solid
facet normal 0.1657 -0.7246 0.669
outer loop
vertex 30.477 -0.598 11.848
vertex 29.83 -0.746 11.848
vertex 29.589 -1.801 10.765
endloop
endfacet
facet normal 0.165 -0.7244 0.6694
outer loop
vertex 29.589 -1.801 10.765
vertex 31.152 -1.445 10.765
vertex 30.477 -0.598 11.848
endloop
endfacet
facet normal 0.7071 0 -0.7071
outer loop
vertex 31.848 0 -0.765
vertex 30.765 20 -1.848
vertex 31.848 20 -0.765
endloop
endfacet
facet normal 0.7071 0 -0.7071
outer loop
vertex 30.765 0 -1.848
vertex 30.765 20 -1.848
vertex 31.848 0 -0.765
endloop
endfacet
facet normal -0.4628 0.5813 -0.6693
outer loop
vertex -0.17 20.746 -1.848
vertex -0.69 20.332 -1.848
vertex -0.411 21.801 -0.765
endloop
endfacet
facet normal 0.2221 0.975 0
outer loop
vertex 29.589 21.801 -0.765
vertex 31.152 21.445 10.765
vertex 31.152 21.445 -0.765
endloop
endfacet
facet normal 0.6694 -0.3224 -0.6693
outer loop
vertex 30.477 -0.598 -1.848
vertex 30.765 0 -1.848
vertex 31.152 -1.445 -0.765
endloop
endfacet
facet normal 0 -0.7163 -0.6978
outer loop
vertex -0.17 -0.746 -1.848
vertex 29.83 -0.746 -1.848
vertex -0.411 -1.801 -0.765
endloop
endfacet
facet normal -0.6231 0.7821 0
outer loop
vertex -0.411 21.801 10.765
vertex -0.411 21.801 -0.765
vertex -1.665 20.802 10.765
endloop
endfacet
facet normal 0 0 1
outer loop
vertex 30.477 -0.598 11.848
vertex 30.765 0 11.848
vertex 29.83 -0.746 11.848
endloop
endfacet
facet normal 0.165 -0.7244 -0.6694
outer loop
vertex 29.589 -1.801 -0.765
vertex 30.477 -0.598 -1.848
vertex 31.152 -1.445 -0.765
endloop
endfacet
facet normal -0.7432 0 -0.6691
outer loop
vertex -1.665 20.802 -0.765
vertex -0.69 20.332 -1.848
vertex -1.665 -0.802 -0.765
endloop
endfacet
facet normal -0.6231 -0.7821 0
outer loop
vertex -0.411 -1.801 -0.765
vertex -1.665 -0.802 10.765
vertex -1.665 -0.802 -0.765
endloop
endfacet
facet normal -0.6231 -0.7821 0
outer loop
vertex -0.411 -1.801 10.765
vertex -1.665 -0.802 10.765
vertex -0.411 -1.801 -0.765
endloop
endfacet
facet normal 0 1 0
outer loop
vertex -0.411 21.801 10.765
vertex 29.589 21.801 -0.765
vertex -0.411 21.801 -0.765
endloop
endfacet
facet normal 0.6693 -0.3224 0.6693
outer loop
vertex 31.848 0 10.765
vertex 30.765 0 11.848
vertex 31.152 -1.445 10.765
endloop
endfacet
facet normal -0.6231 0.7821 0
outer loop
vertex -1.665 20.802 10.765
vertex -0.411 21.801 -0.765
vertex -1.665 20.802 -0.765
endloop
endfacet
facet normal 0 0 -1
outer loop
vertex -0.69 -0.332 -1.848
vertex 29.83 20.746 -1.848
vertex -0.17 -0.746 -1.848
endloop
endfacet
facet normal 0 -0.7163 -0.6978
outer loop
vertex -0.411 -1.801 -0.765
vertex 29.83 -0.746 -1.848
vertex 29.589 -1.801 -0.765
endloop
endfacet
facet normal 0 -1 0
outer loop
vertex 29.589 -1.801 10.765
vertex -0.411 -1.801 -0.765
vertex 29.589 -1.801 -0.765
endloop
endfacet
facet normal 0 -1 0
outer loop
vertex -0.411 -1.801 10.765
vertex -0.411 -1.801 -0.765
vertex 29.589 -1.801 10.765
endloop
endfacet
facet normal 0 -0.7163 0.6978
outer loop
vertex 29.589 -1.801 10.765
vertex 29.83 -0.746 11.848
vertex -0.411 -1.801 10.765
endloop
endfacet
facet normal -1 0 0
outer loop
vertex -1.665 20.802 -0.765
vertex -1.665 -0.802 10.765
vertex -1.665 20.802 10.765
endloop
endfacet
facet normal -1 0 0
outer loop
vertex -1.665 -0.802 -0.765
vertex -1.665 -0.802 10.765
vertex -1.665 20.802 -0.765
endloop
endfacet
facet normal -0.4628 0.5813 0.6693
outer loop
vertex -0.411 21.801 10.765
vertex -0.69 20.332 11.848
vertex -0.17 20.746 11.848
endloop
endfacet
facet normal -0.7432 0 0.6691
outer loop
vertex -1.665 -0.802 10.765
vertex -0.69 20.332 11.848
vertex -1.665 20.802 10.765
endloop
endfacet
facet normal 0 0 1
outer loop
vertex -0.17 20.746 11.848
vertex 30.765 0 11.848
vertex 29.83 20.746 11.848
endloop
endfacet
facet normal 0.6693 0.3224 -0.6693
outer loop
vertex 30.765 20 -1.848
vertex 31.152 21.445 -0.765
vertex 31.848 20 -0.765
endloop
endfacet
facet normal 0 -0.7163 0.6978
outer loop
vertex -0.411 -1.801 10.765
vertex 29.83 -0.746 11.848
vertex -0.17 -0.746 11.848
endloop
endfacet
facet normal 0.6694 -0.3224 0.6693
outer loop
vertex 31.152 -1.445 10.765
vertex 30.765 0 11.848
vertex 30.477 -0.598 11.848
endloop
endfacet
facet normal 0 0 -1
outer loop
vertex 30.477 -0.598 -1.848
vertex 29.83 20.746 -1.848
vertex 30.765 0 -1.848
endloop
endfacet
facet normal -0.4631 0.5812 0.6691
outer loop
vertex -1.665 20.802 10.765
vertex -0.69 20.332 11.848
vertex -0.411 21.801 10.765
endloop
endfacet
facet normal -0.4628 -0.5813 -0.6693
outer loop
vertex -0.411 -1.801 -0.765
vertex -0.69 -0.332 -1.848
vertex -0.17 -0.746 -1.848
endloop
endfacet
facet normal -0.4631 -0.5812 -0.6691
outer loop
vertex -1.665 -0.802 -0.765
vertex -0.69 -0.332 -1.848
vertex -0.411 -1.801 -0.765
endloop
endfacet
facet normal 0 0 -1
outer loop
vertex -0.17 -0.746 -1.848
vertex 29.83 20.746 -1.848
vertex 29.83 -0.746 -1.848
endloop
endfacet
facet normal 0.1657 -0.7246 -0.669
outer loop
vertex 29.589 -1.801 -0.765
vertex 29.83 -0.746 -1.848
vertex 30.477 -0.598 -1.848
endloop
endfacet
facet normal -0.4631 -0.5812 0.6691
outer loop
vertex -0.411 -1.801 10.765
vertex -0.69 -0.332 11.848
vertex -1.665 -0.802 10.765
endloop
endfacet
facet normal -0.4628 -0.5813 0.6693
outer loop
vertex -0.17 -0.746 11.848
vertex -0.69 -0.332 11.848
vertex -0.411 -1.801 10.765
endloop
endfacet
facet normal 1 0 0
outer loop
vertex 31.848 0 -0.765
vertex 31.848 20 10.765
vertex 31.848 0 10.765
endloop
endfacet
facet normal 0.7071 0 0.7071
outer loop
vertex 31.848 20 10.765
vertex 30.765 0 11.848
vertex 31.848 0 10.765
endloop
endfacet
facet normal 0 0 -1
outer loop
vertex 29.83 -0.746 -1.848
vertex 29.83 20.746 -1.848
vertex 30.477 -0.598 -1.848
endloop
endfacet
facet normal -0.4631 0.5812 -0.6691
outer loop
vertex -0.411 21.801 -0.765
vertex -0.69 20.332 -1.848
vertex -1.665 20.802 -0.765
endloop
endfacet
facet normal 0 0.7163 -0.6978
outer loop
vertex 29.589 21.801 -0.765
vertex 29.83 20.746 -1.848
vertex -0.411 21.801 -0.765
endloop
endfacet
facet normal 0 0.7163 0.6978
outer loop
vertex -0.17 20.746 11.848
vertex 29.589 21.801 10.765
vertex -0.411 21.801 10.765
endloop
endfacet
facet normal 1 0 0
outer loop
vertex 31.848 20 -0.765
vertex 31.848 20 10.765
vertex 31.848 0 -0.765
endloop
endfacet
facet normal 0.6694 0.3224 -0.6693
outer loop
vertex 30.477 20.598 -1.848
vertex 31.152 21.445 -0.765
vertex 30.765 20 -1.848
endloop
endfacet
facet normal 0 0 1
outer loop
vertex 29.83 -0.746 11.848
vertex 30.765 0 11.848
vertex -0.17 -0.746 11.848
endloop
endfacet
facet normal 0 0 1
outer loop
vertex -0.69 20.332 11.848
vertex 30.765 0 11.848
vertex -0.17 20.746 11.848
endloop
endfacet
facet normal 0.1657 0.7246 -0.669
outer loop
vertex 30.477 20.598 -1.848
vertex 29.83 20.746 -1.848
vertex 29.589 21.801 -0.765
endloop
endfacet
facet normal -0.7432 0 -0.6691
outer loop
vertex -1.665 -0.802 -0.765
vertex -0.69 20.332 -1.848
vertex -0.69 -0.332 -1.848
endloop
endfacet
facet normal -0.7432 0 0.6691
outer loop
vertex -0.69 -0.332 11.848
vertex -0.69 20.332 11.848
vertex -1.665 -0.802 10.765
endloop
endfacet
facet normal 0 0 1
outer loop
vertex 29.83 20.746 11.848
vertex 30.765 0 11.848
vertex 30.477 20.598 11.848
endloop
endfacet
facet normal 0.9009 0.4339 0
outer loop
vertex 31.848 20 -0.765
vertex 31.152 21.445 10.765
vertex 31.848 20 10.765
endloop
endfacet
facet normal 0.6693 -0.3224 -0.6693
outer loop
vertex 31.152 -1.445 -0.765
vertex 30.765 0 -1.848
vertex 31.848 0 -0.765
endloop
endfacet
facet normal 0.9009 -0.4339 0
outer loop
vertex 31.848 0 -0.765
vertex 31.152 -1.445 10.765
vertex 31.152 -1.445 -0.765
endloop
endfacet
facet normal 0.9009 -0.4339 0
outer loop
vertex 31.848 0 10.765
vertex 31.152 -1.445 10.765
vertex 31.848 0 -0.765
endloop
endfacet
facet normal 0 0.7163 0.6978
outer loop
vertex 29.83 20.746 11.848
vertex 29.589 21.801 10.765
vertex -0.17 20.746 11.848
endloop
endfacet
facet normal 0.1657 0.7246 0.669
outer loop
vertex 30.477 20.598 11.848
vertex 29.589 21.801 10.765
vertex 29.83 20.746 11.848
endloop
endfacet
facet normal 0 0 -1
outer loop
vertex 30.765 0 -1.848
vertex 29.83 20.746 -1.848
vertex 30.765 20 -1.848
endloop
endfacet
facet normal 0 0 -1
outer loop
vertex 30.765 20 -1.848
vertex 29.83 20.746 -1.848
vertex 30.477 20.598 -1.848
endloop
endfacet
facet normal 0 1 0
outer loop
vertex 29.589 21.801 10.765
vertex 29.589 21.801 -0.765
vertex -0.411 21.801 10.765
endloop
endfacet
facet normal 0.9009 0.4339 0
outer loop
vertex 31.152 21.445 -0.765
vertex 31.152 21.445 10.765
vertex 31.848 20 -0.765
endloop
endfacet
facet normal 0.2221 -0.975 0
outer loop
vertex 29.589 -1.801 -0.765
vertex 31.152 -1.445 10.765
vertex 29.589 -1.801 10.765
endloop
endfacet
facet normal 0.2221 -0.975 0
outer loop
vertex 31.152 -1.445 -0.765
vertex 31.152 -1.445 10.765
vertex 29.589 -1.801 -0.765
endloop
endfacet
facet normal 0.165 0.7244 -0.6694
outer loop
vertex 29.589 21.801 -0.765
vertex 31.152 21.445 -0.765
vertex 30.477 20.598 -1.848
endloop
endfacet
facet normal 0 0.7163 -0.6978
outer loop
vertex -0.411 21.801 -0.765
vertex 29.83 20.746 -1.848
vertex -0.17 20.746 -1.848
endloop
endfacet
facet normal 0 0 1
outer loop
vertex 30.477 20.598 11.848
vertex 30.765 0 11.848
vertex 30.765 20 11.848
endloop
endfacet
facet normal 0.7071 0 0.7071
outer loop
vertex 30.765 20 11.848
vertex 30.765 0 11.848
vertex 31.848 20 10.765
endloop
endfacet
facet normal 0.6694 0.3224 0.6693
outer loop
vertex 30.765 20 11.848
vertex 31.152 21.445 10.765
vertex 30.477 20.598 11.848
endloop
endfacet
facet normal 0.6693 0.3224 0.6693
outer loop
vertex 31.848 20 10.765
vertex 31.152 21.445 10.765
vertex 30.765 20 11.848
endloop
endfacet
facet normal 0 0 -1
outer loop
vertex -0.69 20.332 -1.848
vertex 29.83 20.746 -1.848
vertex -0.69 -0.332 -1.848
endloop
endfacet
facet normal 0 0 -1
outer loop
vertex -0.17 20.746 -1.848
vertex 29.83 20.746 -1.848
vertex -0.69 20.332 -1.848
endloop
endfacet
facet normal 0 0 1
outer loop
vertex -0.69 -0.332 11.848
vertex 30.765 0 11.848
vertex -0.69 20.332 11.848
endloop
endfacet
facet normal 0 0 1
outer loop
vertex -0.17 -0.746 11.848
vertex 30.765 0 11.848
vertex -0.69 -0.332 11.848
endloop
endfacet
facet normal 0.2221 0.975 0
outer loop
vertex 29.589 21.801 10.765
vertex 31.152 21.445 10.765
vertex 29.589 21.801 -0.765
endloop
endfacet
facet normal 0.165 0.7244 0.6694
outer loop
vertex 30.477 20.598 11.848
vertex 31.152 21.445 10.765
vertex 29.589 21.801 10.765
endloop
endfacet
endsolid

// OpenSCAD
// case 02: a ball on either side is the exact offset.
minkowski() { cube([30, 20, 10]); sphere(2); }
